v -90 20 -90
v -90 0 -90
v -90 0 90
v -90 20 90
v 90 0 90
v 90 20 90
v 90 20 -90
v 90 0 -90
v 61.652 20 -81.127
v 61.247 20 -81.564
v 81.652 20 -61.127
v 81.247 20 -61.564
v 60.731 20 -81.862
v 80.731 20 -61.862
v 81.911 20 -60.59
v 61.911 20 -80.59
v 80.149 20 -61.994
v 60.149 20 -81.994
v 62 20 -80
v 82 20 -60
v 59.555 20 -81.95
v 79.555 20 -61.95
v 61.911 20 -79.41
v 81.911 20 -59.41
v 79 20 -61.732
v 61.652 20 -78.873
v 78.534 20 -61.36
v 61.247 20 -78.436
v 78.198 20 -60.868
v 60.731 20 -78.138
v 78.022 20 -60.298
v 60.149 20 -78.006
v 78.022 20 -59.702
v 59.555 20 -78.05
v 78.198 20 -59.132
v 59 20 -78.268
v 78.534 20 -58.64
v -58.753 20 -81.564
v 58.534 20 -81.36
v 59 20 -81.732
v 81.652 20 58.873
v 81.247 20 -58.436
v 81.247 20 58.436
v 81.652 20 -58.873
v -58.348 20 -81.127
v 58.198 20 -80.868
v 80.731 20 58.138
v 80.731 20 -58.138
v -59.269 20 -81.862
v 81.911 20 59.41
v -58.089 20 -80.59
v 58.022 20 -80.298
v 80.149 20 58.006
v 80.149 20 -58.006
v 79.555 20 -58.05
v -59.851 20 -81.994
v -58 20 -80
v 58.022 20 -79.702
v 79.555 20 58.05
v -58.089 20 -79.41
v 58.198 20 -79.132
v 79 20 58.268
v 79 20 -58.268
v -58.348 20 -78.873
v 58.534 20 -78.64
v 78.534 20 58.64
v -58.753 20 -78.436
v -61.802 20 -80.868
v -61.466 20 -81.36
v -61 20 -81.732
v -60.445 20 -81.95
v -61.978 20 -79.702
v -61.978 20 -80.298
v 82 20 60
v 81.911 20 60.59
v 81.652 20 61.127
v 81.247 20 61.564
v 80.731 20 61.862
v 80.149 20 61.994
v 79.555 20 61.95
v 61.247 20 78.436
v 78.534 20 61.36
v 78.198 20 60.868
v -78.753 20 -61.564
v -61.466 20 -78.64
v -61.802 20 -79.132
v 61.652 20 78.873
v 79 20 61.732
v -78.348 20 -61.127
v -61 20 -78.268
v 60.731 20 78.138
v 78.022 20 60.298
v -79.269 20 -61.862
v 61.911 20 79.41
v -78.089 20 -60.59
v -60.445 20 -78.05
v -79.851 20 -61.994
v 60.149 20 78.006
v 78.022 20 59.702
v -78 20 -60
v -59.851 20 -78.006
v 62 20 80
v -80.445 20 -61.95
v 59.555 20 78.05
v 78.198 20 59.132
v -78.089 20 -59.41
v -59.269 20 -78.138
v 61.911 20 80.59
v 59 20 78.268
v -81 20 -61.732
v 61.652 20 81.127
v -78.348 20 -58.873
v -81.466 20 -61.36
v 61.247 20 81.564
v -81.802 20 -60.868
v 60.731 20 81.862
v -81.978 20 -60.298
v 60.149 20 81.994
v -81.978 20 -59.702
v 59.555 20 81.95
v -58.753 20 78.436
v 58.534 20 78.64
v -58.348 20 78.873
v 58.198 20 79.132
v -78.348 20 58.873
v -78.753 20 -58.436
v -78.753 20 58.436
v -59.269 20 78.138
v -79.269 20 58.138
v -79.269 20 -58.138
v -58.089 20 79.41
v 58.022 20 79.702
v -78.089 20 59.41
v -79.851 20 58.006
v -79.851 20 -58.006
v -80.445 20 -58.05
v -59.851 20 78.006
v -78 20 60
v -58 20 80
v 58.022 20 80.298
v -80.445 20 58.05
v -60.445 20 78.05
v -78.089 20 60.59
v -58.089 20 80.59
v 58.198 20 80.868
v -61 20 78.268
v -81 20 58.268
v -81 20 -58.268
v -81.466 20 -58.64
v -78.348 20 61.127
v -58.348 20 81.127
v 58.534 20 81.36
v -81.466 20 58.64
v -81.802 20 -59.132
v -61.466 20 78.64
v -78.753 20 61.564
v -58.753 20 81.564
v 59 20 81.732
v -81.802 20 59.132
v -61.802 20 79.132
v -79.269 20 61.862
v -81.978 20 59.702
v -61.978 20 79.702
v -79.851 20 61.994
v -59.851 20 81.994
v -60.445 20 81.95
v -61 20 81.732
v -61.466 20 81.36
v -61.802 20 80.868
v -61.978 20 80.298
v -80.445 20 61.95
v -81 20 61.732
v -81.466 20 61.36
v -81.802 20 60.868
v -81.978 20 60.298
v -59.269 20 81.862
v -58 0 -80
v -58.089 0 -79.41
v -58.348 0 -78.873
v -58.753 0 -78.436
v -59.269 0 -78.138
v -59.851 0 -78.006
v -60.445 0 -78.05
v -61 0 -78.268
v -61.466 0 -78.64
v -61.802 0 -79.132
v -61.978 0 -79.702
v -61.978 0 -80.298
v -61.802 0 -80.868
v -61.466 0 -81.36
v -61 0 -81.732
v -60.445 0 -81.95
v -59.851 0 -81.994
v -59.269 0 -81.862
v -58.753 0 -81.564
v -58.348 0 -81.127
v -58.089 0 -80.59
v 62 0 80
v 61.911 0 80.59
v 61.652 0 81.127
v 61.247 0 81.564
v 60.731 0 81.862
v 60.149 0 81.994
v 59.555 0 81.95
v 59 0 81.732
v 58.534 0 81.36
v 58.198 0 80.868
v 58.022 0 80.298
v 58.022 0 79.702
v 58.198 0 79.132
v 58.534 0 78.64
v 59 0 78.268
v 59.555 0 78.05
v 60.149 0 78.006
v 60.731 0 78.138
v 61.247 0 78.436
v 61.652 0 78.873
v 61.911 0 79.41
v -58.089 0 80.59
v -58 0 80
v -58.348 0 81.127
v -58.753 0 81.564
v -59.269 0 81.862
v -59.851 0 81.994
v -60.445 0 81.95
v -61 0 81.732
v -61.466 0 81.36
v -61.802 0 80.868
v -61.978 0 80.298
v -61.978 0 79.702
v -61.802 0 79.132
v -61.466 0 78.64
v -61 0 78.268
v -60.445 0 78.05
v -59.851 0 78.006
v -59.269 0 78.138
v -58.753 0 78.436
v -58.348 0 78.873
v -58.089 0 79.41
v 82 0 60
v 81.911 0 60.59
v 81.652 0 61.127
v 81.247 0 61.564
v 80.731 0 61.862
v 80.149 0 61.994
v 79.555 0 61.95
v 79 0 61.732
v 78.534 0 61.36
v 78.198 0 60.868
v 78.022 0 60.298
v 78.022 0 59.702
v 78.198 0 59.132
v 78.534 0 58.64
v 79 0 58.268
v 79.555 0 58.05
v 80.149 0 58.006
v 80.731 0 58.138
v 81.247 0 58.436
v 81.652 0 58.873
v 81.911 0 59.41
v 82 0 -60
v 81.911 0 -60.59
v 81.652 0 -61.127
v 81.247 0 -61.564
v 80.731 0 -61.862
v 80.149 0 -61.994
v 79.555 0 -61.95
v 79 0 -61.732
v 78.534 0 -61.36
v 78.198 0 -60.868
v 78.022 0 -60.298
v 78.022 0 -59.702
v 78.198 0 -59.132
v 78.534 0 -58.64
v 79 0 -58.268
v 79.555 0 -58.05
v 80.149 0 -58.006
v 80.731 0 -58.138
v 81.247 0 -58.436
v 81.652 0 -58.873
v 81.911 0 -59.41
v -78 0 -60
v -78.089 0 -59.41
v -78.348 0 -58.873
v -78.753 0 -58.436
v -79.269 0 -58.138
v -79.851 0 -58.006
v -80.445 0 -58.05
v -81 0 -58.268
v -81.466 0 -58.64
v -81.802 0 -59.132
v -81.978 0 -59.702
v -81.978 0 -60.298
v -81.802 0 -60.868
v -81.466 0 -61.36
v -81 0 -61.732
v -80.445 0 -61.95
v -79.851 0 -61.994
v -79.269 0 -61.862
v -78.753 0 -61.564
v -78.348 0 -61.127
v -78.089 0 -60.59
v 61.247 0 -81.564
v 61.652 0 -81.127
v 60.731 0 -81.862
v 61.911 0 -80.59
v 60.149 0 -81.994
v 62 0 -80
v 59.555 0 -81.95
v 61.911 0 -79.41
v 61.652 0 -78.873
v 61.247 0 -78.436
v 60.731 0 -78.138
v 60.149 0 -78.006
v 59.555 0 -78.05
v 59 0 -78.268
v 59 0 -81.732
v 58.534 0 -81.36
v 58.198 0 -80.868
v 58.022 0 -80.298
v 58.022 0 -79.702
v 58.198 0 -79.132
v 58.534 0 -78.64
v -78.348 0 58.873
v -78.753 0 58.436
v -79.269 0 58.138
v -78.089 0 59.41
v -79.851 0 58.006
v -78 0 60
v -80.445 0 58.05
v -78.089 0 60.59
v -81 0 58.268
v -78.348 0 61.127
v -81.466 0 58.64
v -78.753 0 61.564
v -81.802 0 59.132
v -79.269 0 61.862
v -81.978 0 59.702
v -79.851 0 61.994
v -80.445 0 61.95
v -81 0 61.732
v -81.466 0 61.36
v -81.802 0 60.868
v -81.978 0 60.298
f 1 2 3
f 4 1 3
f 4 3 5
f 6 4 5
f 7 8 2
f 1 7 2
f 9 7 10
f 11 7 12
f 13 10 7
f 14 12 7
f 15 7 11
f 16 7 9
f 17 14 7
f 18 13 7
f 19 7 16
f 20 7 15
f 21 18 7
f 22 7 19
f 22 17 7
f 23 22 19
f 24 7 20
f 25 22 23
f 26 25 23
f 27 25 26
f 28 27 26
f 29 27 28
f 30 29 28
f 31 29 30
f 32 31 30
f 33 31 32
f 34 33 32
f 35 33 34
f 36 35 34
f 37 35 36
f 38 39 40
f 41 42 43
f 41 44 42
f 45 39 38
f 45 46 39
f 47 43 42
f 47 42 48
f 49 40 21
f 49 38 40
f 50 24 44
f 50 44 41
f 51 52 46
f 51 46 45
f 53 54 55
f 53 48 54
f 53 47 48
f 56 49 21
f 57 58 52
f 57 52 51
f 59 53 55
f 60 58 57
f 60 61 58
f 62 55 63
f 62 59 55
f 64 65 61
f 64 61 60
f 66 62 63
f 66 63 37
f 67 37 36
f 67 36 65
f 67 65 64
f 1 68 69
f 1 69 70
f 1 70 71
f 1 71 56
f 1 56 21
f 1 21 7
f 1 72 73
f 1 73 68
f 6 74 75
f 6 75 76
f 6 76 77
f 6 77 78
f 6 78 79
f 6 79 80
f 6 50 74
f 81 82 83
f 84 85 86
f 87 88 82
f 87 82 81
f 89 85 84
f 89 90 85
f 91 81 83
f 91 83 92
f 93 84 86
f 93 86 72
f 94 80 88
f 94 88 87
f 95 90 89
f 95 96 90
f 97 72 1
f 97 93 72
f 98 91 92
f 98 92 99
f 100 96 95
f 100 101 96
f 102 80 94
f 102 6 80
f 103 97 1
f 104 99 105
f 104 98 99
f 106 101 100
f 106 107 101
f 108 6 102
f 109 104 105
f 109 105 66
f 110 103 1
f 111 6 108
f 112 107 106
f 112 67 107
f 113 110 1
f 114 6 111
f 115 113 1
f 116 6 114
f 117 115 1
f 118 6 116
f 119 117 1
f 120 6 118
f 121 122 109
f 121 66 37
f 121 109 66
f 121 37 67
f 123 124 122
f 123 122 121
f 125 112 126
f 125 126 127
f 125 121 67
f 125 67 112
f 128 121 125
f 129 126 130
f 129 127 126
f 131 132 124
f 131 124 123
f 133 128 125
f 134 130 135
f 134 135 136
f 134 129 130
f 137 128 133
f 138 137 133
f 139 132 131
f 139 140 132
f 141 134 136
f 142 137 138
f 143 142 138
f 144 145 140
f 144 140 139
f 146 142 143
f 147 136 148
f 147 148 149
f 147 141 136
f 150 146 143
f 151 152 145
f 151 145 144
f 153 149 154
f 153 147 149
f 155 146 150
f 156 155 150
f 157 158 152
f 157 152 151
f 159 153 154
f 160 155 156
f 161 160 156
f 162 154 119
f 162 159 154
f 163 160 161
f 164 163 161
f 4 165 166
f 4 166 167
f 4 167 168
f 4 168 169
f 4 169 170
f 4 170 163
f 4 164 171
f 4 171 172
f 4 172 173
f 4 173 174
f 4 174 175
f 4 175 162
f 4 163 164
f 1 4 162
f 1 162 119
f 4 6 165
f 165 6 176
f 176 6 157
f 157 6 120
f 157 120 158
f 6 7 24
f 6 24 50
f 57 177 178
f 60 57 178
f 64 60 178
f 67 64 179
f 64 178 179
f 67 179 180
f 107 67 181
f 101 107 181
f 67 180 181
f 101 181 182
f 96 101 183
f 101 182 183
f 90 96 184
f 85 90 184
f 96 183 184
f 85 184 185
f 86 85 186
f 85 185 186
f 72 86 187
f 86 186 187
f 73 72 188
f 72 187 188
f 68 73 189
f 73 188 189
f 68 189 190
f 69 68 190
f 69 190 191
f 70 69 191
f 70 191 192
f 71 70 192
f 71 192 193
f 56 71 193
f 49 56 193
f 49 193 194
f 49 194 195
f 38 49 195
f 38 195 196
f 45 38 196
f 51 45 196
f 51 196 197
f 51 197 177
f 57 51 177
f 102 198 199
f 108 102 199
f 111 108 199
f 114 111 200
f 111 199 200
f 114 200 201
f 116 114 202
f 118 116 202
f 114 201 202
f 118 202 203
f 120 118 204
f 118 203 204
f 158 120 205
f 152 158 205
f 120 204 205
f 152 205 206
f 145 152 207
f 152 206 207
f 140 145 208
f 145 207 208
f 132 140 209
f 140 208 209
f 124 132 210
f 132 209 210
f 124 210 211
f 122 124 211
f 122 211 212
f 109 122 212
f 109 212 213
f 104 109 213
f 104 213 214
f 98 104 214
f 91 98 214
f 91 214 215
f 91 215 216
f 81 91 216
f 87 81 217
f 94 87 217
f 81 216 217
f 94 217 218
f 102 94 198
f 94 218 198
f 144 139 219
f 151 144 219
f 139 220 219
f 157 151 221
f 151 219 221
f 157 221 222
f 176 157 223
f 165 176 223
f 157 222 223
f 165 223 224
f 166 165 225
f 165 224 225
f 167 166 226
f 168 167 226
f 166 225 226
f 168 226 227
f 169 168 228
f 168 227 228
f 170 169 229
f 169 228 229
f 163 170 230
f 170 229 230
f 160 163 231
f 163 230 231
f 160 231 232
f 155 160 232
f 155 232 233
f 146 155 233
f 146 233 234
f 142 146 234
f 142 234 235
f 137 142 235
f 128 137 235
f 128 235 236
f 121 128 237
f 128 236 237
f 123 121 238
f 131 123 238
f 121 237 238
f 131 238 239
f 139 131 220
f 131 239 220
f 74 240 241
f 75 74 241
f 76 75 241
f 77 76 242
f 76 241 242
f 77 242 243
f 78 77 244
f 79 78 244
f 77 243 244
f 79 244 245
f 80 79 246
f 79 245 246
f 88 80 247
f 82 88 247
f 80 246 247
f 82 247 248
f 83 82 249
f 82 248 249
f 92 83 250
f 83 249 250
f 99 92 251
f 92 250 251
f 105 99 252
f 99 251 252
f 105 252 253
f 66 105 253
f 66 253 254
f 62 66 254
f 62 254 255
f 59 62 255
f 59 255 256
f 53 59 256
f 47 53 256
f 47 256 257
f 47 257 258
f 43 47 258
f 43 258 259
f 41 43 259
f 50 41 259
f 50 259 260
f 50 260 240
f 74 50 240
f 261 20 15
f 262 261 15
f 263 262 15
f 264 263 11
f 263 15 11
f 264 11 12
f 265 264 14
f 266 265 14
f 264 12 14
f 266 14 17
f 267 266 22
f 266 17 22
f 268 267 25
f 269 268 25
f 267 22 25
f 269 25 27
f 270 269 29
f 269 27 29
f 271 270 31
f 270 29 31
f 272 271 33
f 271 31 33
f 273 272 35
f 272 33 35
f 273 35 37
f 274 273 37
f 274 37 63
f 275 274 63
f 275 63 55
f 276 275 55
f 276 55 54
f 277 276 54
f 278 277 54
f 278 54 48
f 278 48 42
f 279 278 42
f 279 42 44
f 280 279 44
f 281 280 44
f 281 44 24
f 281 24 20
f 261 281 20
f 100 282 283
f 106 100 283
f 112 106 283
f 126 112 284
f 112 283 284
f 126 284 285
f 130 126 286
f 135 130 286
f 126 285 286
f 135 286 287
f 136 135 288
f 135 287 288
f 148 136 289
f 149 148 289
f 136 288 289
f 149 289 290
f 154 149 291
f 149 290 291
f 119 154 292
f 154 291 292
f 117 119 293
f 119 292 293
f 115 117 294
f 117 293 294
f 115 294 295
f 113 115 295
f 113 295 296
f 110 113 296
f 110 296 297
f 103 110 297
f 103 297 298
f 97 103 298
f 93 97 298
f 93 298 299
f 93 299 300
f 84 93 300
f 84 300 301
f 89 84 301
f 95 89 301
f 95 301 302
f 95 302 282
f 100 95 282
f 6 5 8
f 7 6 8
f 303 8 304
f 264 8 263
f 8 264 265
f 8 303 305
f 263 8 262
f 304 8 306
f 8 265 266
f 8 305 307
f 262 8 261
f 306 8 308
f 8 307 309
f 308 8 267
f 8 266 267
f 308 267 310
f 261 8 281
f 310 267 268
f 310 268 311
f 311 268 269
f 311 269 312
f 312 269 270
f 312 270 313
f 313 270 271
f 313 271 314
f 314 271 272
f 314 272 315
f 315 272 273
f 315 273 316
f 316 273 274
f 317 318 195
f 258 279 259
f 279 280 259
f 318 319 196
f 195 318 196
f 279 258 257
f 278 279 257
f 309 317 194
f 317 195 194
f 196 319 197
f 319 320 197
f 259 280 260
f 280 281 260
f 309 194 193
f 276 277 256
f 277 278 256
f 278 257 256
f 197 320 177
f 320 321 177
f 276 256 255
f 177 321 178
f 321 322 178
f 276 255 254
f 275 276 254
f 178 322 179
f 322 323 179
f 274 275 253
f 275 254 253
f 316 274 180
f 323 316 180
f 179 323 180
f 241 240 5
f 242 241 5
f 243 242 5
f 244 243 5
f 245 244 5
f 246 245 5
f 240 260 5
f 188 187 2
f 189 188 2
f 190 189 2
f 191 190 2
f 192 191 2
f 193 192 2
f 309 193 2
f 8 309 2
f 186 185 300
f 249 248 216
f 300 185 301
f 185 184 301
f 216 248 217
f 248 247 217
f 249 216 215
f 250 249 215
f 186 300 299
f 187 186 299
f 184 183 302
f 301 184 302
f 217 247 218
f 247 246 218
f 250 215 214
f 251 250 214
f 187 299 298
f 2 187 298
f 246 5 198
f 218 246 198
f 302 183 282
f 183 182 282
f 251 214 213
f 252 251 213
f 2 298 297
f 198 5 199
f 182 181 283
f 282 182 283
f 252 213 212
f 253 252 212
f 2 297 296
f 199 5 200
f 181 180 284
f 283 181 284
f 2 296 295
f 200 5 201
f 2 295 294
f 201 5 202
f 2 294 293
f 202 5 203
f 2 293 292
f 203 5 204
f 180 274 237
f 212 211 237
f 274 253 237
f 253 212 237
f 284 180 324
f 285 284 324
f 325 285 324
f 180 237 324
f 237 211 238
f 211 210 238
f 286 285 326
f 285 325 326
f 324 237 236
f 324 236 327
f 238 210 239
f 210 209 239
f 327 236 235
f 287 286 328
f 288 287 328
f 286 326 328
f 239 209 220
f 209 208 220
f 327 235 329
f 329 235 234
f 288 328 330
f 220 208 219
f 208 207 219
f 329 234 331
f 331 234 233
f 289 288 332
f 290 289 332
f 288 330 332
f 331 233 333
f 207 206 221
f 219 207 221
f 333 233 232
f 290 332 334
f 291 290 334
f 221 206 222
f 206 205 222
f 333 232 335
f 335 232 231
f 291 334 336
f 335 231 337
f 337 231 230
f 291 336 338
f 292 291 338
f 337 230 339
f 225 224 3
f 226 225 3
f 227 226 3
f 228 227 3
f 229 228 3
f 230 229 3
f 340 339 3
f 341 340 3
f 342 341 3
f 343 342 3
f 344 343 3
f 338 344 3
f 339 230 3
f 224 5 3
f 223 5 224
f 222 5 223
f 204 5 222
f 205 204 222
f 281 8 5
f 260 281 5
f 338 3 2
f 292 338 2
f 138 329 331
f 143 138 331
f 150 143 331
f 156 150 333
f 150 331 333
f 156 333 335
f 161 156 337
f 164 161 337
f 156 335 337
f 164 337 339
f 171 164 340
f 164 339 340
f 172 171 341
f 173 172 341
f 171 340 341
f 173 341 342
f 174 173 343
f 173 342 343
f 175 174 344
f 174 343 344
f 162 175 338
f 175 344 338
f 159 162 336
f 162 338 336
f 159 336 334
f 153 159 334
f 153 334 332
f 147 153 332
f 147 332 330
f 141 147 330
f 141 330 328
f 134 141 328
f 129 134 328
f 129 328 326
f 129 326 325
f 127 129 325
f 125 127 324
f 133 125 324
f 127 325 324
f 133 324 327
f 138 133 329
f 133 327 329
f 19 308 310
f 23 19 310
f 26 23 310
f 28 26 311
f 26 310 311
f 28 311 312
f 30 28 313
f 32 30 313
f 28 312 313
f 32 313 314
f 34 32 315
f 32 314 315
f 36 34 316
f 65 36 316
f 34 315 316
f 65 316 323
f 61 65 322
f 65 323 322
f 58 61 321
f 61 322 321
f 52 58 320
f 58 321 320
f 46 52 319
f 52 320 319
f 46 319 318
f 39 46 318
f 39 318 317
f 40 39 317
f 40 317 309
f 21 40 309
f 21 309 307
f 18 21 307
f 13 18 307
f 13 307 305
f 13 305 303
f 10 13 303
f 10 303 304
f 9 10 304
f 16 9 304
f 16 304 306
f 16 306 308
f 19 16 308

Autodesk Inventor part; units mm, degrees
ref_plane "YZ Plane" through (0, 0, 0) normal (1, 0, 0) x (0, 1, 0)
ref_plane "XZ Plane" through (0, 0, 0) normal (0, 1, 0) x (-1, 0, 0)
ref_plane "XY Plane" through (0, 0, 0) normal (0, 0, 1) x (1, 0, 0)
sketch "草图2" plane through (0, 0, 0) normal (0, 1, 0) x (-1, 0, 0)
  line L0 (90, 90) -> (-90, 90)
  line L1 (-90, 90) -> (-90, -90)
  line L2 (-90, -90) -> (90, -90)
  line L3 (90, -90) -> (90, 90)
  point P0 (0, 0)
  dimension "d4" = 180
  dimension "d5" = 180
extrude "拉伸2" add sketch "草图2" along normal blind 20
sketch "草图3" plane through (0, 20, 0) normal (0, 1, 0) x (1, 0, 0)
  circle A0 centre (80, 60) radius 2
  point P0 (0, 0)
  dimension "d8" = 4
extrude "拉伸3" cut sketch "草图3" against normal through all
sketch "草图4" plane through (0, 0, 0) normal (0, -1, 0) x (1, 0, 0)
  circle A0 centre (60, -80) radius 2
  point P0 (0, 0)
  dimension "d11" = 4
extrude "拉伸4" cut sketch "草图4" against normal through all
sketch "草图5" plane through (0, 0, 0) normal (0, -1, 0) x (1, 0, 0)
  circle A0 centre (80, 60) radius 2
  point P0 (0, 0)
  dimension "d14" = 4
extrude "拉伸5" cut sketch "草图5" against normal through all
sketch "草图6" plane through (0, 0, 0) normal (0, -1, 0) x (1, 0, 0)
  circle A0 centre (60, 80) radius 2
  point P0 (0, 0)
  dimension "d17" = 4
extrude "拉伸6" cut sketch "草图6" against normal through all
sketch "草图7" plane through (0, 0, 0) normal (0, -1, 0) x (1, 0, 0)
  circle A0 centre (-80, -60) radius 2
  point P0 (0, 0)
  dimension "d20" = 4
extrude "拉伸7" cut sketch "草图7" against normal through all
sketch "草图8" plane through (0, 0, 0) normal (0, -1, 0) x (1, 0, 0)
  circle A0 centre (-60, -80) radius 2
  point P0 (0, 0)
  dimension "d23" = 4
extrude "拉伸8" cut sketch "草图8" against normal through all
sketch "草图9" plane through (0, 0, 0) normal (0, -1, 0) x (1, 0, 0)
  circle A0 centre (-80, 60) radius 2
  point P0 (0, 0)
  dimension "d26" = 4
extrude "拉伸9" cut sketch "草图9" against normal through all
sketch "草图10" plane through (0, 0, 0) normal (0, -1, 0) x (1, 0, 0)
  circle A0 centre (-60, 80) radius 2
  point P0 (0, 0)
  dimension "d29" = 4
extrude "拉伸10" cut sketch "草图10" against normal through all
properties part number "内层升降板"
